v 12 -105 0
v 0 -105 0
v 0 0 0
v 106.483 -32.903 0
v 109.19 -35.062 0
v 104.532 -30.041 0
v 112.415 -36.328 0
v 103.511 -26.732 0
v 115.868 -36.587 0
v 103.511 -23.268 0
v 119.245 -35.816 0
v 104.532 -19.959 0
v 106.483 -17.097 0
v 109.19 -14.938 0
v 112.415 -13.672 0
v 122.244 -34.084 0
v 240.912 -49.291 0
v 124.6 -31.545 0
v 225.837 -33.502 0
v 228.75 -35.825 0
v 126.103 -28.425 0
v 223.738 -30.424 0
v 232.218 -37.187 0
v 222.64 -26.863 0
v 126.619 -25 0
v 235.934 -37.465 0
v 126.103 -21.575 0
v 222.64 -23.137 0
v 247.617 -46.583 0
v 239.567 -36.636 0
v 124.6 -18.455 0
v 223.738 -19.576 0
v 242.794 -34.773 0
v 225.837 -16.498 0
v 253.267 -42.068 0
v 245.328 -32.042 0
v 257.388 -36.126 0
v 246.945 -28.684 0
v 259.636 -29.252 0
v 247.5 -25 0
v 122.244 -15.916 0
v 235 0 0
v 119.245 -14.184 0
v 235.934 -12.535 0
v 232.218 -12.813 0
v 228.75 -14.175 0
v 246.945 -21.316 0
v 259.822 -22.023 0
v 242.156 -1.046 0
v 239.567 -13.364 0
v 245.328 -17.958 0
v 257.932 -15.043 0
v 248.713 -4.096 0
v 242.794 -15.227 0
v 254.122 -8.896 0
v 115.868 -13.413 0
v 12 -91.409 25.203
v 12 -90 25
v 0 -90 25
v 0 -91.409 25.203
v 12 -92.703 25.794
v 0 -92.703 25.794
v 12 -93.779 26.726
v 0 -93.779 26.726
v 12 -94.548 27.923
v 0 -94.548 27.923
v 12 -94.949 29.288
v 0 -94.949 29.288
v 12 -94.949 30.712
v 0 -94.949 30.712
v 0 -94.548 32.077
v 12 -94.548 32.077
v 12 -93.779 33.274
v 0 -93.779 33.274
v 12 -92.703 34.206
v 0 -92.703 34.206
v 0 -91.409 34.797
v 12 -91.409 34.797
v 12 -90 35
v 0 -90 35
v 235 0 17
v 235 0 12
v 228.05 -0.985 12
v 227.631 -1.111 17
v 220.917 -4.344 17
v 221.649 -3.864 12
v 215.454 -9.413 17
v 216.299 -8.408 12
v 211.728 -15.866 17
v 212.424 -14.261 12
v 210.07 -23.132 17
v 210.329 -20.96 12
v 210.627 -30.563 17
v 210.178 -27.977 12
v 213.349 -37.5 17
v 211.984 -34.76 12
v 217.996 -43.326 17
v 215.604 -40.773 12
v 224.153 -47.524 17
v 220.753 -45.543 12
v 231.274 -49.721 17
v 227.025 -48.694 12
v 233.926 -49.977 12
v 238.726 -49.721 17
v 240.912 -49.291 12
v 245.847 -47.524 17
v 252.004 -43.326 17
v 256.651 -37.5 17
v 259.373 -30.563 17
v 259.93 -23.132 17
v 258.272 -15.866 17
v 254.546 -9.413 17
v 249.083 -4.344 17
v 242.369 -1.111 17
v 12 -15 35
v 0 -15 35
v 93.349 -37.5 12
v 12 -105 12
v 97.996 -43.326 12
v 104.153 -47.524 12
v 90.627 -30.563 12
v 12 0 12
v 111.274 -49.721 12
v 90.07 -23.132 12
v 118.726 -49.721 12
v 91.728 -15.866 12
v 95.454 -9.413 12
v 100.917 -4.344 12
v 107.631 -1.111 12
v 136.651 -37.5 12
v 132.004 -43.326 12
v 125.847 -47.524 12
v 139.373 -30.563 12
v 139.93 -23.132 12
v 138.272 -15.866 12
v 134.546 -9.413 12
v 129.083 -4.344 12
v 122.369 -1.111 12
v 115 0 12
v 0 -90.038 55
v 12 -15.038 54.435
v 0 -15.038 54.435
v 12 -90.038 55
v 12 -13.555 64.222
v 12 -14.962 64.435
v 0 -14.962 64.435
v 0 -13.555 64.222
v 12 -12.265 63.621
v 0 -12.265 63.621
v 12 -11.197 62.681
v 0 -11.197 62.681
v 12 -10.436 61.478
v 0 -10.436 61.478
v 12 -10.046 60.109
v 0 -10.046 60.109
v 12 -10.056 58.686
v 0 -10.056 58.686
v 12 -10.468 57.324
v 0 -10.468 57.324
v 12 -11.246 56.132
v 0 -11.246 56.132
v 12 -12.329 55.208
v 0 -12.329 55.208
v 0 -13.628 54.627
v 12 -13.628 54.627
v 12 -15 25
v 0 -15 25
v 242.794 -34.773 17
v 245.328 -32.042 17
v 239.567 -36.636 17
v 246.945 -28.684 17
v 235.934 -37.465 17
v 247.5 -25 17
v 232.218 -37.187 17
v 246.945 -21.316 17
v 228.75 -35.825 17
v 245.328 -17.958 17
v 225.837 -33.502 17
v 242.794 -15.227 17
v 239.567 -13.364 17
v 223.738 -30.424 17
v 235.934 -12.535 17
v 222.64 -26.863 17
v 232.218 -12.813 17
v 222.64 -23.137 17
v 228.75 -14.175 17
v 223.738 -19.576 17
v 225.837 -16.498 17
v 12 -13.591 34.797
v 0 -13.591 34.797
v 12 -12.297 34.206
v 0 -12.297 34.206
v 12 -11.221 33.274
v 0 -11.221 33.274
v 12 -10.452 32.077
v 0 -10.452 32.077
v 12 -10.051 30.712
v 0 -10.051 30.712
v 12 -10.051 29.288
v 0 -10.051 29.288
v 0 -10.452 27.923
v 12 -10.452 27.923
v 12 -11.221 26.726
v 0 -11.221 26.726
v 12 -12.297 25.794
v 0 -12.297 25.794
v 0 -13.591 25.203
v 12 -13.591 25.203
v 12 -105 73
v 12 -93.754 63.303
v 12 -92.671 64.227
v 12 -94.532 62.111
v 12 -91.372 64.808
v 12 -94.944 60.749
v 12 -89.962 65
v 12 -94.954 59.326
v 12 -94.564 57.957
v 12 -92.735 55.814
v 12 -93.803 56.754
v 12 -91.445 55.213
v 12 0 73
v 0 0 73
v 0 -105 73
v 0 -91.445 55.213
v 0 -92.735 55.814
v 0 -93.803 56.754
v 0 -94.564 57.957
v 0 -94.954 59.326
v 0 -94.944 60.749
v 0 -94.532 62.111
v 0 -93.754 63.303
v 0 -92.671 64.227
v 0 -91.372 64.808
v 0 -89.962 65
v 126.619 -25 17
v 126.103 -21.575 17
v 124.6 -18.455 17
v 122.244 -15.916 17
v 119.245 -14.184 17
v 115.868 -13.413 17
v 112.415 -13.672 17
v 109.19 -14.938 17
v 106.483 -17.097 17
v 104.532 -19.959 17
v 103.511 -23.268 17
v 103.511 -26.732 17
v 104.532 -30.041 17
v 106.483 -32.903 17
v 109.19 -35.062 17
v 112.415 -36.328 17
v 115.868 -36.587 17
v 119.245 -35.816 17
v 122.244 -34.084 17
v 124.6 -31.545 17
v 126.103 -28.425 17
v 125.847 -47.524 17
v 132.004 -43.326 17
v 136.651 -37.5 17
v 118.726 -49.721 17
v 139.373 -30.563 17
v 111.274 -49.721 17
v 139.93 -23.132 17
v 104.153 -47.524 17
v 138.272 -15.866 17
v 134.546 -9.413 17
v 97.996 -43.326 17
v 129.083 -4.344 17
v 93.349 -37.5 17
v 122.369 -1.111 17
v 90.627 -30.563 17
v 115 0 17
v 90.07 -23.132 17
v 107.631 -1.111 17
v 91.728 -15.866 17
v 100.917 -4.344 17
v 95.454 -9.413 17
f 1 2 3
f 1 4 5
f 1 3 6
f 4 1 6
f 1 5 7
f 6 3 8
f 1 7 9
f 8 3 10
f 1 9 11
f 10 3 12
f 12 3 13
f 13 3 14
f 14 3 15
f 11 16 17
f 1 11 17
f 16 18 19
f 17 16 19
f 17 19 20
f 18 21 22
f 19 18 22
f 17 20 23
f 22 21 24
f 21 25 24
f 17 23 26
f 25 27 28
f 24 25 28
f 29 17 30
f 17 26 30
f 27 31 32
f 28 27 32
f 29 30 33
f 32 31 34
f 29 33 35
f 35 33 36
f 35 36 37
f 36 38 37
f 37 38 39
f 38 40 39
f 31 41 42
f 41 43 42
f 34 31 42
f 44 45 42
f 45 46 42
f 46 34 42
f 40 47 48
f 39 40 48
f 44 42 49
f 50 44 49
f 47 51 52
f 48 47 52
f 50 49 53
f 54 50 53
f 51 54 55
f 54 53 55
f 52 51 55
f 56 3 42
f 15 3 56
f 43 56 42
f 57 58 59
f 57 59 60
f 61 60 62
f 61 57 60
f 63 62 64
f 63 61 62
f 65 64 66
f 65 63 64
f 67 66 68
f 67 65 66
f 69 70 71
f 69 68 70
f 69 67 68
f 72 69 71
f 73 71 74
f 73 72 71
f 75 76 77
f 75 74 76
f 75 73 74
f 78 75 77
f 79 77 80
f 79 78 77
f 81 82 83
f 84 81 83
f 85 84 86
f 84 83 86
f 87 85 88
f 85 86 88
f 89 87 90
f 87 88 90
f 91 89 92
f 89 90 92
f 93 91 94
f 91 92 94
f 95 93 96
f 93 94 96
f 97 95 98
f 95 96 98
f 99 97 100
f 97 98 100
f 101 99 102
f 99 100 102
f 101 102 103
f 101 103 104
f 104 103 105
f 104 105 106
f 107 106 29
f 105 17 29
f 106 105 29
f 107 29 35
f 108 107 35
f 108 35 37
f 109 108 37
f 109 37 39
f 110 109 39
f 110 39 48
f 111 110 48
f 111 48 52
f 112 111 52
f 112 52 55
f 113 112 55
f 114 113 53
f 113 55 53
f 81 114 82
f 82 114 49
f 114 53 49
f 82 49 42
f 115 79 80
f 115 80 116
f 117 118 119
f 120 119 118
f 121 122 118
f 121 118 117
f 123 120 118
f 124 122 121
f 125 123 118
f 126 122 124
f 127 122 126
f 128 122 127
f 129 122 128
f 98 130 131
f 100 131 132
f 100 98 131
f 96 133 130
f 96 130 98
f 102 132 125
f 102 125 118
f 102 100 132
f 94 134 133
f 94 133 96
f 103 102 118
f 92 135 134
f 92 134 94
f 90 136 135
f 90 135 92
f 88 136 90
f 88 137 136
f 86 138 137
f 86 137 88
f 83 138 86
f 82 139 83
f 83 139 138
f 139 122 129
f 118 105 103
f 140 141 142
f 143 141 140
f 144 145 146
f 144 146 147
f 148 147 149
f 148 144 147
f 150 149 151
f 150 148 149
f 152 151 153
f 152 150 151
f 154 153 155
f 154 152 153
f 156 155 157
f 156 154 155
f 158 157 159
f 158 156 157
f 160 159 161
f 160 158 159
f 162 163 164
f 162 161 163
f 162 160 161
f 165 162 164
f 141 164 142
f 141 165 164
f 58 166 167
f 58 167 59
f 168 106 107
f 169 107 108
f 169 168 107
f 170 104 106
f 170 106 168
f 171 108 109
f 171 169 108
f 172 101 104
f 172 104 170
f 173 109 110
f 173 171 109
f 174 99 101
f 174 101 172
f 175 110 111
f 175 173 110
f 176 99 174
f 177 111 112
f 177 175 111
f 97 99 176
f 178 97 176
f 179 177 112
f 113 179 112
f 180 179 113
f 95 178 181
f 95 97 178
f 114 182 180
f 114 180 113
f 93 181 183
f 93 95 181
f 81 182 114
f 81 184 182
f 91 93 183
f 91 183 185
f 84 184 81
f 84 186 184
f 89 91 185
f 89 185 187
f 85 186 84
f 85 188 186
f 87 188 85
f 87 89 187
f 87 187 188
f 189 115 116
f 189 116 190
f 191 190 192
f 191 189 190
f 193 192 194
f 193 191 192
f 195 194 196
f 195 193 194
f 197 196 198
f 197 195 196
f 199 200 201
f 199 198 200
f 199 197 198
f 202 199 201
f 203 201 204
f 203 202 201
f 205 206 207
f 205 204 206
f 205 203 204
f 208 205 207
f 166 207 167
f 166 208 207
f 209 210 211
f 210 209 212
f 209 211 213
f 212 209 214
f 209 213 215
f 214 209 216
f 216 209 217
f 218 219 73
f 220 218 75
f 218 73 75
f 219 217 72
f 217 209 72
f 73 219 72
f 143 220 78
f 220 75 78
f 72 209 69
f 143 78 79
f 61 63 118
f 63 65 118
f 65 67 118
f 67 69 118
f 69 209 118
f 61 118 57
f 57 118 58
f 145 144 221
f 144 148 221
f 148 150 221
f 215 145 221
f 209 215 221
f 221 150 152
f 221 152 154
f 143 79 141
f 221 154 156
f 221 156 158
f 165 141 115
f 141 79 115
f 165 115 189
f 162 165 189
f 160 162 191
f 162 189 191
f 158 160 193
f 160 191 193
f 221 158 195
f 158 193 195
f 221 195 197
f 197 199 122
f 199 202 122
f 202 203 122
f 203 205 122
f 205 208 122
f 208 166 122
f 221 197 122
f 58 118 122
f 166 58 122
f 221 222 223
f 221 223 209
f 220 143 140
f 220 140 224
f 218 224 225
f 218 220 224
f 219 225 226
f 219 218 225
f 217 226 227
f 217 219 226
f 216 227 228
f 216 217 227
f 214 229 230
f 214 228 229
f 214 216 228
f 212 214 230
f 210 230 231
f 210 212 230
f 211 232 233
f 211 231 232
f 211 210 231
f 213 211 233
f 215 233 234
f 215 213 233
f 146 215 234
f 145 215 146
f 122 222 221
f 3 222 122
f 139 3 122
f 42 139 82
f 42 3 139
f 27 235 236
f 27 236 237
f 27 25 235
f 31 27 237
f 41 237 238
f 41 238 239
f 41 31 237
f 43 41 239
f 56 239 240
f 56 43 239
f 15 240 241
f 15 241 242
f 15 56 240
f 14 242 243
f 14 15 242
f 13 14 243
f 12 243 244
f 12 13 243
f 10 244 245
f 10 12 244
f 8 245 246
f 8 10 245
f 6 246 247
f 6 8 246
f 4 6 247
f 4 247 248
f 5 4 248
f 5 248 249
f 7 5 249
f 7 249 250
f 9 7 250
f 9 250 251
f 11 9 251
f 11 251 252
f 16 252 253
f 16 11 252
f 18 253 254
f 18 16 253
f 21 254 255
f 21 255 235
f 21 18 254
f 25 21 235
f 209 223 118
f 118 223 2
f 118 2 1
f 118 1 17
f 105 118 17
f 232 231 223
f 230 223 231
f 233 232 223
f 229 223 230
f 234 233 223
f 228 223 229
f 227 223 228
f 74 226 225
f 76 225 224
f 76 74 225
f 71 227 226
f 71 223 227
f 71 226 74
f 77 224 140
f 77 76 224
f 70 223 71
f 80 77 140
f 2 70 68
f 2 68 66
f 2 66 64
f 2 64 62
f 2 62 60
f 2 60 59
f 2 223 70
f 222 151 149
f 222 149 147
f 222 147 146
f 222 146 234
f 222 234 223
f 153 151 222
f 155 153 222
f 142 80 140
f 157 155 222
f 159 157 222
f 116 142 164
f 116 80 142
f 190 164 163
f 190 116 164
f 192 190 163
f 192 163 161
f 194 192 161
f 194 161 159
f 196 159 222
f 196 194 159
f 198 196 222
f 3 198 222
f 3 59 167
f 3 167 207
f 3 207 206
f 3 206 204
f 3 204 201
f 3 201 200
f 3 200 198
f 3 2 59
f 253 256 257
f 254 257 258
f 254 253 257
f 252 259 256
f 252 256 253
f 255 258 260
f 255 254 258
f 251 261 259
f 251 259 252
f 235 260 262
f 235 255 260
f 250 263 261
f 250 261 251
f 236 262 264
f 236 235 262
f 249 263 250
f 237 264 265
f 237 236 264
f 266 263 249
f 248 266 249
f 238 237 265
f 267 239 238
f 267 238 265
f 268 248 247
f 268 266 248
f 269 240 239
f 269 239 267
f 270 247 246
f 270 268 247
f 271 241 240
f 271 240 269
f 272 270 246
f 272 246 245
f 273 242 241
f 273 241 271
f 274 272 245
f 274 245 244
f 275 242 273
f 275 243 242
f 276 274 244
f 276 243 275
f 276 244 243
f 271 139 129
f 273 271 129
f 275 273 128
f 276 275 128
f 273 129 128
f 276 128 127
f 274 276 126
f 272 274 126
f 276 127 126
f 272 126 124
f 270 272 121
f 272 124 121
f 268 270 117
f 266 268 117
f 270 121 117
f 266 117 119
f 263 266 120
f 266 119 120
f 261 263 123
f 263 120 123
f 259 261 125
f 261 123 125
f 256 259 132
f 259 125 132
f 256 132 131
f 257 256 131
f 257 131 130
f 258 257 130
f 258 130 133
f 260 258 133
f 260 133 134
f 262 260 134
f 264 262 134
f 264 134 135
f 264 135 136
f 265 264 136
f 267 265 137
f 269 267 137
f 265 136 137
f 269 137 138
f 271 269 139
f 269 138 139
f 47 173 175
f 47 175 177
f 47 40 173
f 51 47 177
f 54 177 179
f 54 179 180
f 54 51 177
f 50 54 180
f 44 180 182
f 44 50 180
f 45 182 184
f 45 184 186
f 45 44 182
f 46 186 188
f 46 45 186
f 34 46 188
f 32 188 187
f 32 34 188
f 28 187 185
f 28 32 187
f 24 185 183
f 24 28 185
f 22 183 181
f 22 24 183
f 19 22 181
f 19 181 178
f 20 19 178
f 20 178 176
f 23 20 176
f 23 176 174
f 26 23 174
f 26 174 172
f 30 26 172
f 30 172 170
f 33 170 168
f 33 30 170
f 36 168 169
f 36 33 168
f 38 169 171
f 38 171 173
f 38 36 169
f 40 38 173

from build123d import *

# Parameters (mm, degrees)
SKETCH1_R            = 25
SKETCH1_R_2          = 11.619106241
SKETCH1_R_3          = 12.5
BOSS_EXTRUDE41_DEPTH = 12
SKETCH1_11_W         = 12
SKETCH1_11_H         = 105
BOSS_EXTRUDE42_DEPTH = 73
BOSS_EXTRUDE43_START = 12
SKETCH1_12_R         = 25
SKETCH1_12_R_2       = 11.619106241
SKETCH1_12_R_3       = 12.5
BOSS_EXTRUDE43_DEPTH = 5
CUT_EXTRUDE1_DEPTH   = 280.030464287


with BuildPart() as part:
    # Sketch1 → Boss-Extrude41 (new body)
    # profile 1 of 3: a face of its own
    with BuildSketch(Plane.XY):
        with BuildLine():
            Line((115, 0), (12, 0))
            Line((12, 0), (12, -105))
            Line((12, -105), (240.911574023, -49.291012588))
            ThreePointArc((240.911574023, -49.291012588), (210.177879676, -27.976968701), (235, 0))
            Line((235, 0), (115, 0))
        make_face()
        with BuildLine():
            ThreePointArc((140, -25), (97.32233047, -42.67766953), (115, 0))
            ThreePointArc((115, 0), (132.67766953, -7.32233047), (140, -25))
        make_face(mode=Mode.SUBTRACT)
    # profile 2 of 3: a face of its own
    with BuildSketch(Plane.XY):
        with Locations((115, -25)):
            Circle(SKETCH1_R)
        with Locations((115, -25)):
            Circle(SKETCH1_R_2, mode=Mode.SUBTRACT)
    # profile 3 of 3: a face of its own
    with BuildSketch(Plane.XY):
        with Locations((235, -25)):
            Circle(SKETCH1_R)
        with Locations((235, -25)):
            Circle(SKETCH1_R_3, mode=Mode.SUBTRACT)
    extrude(amount=BOSS_EXTRUDE41_DEPTH)

    # Sketch1<11> → Boss-Extrude42 (add)
    with BuildSketch(Plane.XY):
        with Locations((6, -52.5)):
            Rectangle(SKETCH1_11_W, SKETCH1_11_H)
    extrude(amount=BOSS_EXTRUDE42_DEPTH)

    # Sketch1<12> → Boss-Extrude43 (add)
    # profile 1 of 2: a face of its own
    with BuildSketch(Plane.XY.offset(BOSS_EXTRUDE43_START)):
        with Locations(Location((115, -25, 0), (0, 0, 90))):
            Circle(SKETCH1_12_R)
        with Locations((115, -25)):
            Circle(SKETCH1_12_R_2, mode=Mode.SUBTRACT)
    # profile 2 of 2: a face of its own
    with BuildSketch(Plane.XY.offset(BOSS_EXTRUDE43_START)):
        with Locations(Location((235, -25, 0), (0, 0, 90))):
            Circle(SKETCH1_12_R)
        with Locations((235, -25)):
            Circle(SKETCH1_12_R_3, mode=Mode.SUBTRACT)
    extrude(amount=BOSS_EXTRUDE43_DEPTH)

    # Sketch2 → Cut-Extrude1 (cut, through all)
    with BuildSketch(Plane(origin=(12, 0, 0), x_dir=(0, 0, -1), z_dir=(1, 0, 0))):
        with BuildLine():
            Line((-54.435034179, -15.03767278), (-55.000141926, -90.03767278))
            ThreePointArc((-55.000141926, -90.03767278), (-60.03767278, -94.999858074), (-64.999858074, -89.96232722))
            Line((-64.999858074, -89.96232722), (-64.434750327, -14.96232722))
            ThreePointArc((-64.434750327, -14.96232722), (-59.397219473, -10.000141926), (-54.435034179, -15.03767278))
        make_face()
        with BuildLine():
            Line((-25, -15), (-25, -90))
            ThreePointArc((-25, -90), (-30, -95), (-35, -90))
            Line((-35, -90), (-35, -15))
            ThreePointArc((-35, -15), (-30, -10), (-25, -15))
        make_face()
    extrude(amount=-CUT_EXTRUDE1_DEPTH, mode=Mode.SUBTRACT)


solid = part.part
